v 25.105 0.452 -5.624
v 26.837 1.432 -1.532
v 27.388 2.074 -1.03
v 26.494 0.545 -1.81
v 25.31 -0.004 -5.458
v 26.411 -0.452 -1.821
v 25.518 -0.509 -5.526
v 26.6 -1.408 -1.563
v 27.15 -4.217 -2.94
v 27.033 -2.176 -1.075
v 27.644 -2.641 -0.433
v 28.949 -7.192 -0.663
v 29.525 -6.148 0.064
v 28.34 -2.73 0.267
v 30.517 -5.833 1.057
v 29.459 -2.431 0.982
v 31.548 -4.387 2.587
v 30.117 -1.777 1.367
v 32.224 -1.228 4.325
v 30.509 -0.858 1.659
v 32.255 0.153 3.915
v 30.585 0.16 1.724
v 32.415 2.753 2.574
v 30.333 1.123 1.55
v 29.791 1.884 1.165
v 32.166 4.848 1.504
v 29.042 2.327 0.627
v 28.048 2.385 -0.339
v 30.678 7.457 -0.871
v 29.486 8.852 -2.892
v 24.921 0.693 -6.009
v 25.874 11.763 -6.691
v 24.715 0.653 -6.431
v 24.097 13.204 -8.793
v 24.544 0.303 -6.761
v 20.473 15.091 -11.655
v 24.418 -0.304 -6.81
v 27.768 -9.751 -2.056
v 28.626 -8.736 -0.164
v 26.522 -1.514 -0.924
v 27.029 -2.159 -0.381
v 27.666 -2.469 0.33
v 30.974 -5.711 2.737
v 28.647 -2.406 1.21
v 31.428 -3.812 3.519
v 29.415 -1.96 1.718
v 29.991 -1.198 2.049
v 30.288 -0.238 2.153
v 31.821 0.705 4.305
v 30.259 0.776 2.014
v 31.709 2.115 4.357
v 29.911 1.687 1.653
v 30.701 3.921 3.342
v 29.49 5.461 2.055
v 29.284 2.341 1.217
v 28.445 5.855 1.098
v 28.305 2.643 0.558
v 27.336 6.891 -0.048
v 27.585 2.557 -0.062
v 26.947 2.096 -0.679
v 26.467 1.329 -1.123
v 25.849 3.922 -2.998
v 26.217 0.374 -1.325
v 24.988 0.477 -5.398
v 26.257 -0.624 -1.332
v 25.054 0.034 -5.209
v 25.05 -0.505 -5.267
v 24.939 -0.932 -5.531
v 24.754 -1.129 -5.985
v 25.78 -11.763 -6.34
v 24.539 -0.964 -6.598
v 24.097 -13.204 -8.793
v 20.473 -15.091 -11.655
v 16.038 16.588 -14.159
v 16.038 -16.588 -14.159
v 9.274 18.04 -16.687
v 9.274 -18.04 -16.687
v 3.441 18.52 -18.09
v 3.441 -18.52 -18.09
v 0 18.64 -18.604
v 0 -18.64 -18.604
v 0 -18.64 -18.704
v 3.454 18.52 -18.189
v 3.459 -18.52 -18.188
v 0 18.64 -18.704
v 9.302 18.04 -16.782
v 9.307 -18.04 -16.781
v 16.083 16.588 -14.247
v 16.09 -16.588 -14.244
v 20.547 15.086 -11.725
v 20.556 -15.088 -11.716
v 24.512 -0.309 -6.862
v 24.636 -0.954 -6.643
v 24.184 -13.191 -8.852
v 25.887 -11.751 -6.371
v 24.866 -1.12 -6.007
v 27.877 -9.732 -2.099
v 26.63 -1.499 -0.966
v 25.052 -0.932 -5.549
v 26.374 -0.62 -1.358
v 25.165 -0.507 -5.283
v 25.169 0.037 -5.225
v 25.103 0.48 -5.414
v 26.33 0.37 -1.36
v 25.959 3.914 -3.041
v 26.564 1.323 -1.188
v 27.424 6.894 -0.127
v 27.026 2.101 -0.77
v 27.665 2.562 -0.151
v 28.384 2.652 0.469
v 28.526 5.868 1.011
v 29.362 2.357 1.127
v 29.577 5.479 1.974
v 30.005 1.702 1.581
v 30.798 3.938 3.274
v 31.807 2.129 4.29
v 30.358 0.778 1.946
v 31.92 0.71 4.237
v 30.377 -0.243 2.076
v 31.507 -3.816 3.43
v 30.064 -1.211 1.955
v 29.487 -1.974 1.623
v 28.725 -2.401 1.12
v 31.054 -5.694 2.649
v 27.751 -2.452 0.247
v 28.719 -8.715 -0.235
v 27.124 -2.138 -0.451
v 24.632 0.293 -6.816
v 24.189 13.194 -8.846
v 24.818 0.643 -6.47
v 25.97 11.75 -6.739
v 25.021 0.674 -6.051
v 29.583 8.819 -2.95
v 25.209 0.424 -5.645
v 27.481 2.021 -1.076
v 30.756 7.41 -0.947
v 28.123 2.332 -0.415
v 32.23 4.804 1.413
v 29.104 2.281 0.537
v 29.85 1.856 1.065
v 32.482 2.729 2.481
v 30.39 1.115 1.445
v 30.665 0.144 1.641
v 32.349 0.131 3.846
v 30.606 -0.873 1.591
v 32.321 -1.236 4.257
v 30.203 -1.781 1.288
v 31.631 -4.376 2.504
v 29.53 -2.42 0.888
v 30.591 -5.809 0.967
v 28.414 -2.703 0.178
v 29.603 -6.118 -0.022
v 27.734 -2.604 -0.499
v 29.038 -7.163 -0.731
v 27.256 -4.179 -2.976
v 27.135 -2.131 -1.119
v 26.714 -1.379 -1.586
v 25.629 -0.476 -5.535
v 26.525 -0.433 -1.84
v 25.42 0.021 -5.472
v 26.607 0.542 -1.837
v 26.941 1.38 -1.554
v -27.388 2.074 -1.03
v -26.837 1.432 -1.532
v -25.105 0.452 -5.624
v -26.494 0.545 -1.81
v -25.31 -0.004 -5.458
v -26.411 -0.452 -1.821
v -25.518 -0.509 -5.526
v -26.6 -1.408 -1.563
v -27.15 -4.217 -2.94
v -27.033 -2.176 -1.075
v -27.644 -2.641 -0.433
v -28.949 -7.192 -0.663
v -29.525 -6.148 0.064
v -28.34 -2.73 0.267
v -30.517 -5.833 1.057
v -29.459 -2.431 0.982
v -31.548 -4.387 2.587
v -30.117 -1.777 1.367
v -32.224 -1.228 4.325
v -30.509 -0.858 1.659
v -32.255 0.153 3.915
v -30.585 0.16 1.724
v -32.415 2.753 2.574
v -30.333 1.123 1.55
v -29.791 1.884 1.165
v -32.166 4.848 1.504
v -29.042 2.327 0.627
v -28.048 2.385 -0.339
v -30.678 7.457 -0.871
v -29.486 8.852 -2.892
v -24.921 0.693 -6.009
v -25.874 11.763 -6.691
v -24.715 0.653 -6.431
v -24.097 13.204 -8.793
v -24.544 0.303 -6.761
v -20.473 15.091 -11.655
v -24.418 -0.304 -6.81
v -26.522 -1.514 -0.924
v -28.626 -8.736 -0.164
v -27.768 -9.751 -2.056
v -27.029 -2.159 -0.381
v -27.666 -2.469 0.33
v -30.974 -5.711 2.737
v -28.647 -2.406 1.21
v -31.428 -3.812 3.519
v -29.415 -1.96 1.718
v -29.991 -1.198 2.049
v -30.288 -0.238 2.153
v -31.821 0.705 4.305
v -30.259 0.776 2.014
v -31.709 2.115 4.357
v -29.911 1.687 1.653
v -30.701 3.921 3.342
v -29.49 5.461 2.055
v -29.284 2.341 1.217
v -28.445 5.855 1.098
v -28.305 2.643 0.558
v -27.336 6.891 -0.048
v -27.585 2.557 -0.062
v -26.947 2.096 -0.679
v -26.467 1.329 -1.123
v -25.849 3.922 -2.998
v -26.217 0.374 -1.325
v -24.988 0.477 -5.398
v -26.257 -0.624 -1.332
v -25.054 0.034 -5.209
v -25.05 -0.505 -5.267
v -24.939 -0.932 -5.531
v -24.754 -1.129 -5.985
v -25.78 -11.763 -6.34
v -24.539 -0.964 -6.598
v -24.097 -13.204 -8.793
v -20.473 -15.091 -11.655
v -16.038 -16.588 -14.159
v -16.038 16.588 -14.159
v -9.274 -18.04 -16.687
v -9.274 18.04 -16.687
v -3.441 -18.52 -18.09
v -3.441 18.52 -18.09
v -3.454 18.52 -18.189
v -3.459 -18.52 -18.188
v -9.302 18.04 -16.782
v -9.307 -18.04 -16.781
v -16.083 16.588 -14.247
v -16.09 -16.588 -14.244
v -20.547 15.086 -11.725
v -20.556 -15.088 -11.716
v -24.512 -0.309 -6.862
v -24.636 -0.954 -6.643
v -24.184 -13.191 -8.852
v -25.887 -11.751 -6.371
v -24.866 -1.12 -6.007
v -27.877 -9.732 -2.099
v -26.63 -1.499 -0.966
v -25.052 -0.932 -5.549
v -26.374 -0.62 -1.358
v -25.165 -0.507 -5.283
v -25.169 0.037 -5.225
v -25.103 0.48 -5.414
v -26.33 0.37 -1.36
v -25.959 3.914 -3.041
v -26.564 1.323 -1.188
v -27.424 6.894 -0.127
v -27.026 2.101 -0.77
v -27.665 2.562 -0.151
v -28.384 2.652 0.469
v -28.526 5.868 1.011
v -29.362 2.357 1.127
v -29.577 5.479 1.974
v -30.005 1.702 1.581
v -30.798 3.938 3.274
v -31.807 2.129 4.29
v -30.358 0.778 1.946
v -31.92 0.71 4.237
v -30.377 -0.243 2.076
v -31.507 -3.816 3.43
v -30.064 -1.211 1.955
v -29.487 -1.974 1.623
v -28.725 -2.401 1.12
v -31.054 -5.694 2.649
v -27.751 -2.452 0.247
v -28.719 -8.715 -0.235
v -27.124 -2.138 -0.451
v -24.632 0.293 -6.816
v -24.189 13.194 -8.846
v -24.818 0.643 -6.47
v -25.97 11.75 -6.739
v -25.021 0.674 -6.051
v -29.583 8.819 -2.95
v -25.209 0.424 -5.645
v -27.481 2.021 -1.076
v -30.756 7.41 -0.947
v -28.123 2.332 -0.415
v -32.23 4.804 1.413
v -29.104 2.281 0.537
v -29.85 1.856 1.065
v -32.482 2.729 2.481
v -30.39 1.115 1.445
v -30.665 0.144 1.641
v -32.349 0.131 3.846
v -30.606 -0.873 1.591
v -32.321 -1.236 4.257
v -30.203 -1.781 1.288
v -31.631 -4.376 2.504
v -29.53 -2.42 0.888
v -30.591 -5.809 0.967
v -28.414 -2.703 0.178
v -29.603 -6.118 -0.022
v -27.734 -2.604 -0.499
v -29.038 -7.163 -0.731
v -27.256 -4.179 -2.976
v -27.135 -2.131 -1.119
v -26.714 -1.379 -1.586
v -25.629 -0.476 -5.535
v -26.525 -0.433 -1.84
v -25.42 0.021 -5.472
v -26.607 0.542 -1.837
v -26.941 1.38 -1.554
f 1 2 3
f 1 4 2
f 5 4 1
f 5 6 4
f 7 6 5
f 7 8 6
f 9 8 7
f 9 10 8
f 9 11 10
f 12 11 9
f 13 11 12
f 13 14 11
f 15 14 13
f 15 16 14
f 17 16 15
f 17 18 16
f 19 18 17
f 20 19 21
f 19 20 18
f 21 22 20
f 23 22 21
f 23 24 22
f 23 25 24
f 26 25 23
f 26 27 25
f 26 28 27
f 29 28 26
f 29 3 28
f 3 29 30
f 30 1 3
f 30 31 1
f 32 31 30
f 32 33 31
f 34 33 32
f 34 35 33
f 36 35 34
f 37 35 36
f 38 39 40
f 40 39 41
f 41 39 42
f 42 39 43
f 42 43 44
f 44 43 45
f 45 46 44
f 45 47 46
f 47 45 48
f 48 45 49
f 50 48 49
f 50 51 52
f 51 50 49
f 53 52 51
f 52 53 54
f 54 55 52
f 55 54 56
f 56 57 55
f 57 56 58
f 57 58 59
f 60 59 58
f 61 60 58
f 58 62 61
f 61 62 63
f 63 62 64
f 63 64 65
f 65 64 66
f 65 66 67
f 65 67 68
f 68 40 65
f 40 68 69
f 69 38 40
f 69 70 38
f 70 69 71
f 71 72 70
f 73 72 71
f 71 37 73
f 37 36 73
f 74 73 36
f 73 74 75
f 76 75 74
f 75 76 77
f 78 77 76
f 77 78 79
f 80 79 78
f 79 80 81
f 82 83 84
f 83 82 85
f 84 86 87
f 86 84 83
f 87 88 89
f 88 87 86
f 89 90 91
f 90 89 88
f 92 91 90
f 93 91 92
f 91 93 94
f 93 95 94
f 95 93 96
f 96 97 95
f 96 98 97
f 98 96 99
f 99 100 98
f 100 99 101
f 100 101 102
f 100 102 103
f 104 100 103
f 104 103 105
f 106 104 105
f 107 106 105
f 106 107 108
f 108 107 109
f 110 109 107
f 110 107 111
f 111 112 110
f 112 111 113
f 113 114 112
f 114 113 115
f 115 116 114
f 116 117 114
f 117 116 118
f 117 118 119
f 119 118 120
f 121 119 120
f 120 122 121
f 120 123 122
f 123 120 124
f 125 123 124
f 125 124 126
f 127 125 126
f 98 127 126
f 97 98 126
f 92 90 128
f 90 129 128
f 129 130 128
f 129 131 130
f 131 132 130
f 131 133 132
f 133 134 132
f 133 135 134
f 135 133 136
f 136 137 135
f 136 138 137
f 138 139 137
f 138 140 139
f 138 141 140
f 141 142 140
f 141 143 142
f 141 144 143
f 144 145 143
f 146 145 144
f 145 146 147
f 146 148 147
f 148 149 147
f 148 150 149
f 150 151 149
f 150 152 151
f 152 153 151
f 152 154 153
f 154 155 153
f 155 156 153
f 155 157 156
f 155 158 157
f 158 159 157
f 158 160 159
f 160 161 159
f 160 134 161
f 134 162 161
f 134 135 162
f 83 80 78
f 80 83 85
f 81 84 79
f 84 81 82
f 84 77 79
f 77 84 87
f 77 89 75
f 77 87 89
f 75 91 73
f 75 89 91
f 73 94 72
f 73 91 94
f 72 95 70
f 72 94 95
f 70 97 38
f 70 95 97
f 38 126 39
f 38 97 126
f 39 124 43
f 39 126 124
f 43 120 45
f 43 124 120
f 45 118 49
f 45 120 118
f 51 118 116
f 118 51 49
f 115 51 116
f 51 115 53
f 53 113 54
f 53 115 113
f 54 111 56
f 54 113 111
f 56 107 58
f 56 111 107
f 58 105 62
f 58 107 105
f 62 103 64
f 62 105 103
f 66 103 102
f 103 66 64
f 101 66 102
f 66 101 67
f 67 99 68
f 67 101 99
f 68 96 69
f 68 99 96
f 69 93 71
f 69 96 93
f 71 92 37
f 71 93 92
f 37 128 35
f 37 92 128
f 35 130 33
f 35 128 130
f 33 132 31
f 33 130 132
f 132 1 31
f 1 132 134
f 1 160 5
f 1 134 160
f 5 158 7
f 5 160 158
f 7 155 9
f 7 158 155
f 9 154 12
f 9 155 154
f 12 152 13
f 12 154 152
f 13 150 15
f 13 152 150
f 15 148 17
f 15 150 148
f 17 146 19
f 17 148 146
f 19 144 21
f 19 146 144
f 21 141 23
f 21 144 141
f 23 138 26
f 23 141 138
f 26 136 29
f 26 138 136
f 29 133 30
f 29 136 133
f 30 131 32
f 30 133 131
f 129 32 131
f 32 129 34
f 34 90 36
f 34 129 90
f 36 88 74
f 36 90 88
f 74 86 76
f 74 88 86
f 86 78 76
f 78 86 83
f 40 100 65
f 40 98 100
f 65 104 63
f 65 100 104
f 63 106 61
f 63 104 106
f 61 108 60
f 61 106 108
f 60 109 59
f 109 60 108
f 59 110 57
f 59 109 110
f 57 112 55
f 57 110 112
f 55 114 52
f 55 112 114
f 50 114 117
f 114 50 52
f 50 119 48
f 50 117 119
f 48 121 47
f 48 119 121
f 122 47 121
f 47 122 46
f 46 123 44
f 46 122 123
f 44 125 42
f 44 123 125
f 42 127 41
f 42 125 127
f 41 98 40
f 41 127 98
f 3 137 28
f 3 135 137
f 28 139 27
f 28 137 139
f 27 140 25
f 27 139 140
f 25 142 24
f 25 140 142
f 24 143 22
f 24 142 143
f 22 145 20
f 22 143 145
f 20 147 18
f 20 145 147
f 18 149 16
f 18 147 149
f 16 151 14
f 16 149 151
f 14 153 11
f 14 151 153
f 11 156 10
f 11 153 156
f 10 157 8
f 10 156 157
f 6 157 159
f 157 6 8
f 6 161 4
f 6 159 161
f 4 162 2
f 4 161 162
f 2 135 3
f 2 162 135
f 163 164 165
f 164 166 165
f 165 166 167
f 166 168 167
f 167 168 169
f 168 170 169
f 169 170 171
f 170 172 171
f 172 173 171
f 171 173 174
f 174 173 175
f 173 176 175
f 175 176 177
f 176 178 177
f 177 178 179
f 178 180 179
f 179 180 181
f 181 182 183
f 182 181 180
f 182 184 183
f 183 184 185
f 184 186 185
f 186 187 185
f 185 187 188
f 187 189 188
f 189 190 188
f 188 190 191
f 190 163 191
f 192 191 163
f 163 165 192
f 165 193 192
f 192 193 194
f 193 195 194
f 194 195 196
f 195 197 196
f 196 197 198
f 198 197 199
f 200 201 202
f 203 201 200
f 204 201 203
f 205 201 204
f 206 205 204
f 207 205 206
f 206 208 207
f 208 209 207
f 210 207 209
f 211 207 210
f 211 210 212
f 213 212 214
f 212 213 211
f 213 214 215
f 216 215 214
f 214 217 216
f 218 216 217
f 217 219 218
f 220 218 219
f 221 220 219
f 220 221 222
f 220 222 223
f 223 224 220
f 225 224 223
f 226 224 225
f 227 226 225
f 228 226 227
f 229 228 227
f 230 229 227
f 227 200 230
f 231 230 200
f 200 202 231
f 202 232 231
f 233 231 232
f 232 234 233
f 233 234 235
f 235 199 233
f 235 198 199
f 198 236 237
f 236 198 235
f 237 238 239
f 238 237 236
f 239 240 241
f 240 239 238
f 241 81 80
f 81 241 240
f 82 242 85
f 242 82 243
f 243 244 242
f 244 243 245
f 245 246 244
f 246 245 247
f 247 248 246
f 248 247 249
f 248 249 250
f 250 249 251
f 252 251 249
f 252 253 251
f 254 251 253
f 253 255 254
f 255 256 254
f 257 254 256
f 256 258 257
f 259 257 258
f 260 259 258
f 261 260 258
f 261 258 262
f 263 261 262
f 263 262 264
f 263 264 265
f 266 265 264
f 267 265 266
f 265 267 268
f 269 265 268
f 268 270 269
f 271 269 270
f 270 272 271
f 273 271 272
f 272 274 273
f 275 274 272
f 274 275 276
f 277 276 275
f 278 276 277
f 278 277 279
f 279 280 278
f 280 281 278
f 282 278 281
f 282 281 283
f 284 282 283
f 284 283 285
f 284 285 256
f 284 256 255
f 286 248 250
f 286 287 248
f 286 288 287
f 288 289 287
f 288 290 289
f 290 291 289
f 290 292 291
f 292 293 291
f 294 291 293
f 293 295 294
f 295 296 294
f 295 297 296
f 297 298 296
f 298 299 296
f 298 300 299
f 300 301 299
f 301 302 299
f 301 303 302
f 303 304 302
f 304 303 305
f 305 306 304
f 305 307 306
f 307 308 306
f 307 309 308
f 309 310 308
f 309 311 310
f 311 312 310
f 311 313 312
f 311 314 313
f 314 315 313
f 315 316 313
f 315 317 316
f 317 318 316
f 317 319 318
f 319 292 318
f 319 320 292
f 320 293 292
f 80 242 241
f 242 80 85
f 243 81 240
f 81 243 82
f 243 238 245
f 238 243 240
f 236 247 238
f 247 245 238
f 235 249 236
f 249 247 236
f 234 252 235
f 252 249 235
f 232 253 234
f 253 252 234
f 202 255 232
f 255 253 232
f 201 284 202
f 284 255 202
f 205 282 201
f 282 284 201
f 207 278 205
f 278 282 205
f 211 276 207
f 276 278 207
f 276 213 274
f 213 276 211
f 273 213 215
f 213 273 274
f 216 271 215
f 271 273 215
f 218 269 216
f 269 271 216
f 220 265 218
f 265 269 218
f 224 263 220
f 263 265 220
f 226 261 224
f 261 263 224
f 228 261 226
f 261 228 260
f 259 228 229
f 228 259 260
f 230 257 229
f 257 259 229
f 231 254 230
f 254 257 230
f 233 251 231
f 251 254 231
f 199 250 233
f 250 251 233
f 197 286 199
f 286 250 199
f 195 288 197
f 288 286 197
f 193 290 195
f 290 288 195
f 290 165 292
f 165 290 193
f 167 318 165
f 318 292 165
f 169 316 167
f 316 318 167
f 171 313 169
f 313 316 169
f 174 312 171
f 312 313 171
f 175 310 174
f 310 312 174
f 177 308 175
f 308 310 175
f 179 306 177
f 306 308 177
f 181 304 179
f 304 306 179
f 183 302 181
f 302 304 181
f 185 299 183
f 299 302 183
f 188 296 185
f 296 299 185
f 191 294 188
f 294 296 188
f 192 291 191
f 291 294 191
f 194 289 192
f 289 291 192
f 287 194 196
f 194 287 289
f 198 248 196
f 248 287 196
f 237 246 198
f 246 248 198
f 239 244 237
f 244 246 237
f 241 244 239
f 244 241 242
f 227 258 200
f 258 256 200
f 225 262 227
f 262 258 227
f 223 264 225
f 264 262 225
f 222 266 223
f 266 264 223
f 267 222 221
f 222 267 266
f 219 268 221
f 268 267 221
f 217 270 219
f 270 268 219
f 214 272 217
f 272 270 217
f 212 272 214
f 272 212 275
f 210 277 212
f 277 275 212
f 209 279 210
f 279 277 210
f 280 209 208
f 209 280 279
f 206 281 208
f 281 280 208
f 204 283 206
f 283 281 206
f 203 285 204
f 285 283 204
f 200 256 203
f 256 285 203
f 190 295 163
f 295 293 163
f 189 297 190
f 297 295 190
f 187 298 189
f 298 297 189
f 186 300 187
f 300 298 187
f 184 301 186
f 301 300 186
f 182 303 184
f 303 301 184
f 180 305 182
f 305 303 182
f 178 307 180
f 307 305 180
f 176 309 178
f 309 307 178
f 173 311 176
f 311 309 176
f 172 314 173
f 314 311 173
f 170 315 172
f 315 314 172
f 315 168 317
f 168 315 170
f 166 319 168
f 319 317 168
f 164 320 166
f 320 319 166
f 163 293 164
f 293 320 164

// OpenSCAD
use <../lib.scad>
use <s/28981c01s01.scad>
$fa=1; $fs=0.2;
function ldraw_lib__28981c01(realsolid=false) = [
// 0 Sheet Fabric Oval 10 x  5 (Formed as Hammock)
// 0 Name: 28981c01.dat
// 0 Author: Philippe Hurbain [Philo]
// 0 !LDRAW_ORG Part UPDATE 2020-02
// 0 !LICENSE Licensed under CC BY 2.0 and CC BY 4.0 : see CAreadme.txt
// 
// 0 BFC CERTIFY CCW
  [0,"BFC","CERTIFY"],
  [0,"BFC","CCW"],
// 
// 0 !CATEGORY Sheet Fabric
// 0 !KEYWORDS Set 31063
// 
// 0 !HISTORY 2019-06-28 [PTadmin] Official Update 2019-01
// 0 !HISTORY 2020-06-10 [cwdee] Update description
// 0 !HISTORY 2020-09-05 [PTadmin] Official Update 2020-02
// 
// 
// 1 16 0 0 0 1 0 0 0 1 0 0 0 1 s\28981c01s01.dat
  [1,16,0,0,0,1,0,0,0,1,0,0,0,1, ldraw_lib__s__28981c01s01(realsolid)],
// 1 16 0 0 0 -1 0 0 0 1 0 0 0 1 s\28981c01s01.dat
  [1,16,0,0,0,-1,0,0,0,1,0,0,0,1, ldraw_lib__s__28981c01s01(realsolid)],
// 5 24 0 46.51 46.6 0 46.51 -46.6 8.6015 45.2256 -46.3 -8.6015 45.2256 -46.3
  [5,24,0,46.51,46.6,0,46.51,-46.6,8.6015,45.2256,-46.3,-8.6015,45.2256,-46.3],
// 5 24 0 46.7595 -46.6 0 46.7595 46.6 8.6463 45.4694 -46.3 -8.6463 45.4694 -46.3
  [5,24,0,46.7595,-46.6,0,46.7595,46.6,8.6463,45.4694,-46.3,-8.6463,45.4694,-46.3],
// 5 24 0 46.7595 46.6 0 46.51 46.6 8.6015 45.2256 46.3 -8.636 45.4714 46.3
  [5,24,0,46.7595,46.6,0,46.51,46.6,8.6015,45.2256,46.3,-8.636,45.4714,46.3],
// 5 24 0 46.51 -46.6 0 46.7595 -46.6 8.6463 45.4694 -46.3 -8.6015 45.2256 -46.3
  [5,24,0,46.51,-46.6,0,46.7595,-46.6,8.6463,45.4694,-46.3,-8.6015,45.2256,-46.3],
];
module ldraw_lib__28981c01(step=0, col=false, unit=2/5, alt=false, line=0.2, solid=!$preview)
    makepoly(ldraw_lib__28981c01(solid), step=step, col=col, unit=unit, alt=alt, line=line, solid=solid);
ldraw_lib__28981c01(line=0.2);
